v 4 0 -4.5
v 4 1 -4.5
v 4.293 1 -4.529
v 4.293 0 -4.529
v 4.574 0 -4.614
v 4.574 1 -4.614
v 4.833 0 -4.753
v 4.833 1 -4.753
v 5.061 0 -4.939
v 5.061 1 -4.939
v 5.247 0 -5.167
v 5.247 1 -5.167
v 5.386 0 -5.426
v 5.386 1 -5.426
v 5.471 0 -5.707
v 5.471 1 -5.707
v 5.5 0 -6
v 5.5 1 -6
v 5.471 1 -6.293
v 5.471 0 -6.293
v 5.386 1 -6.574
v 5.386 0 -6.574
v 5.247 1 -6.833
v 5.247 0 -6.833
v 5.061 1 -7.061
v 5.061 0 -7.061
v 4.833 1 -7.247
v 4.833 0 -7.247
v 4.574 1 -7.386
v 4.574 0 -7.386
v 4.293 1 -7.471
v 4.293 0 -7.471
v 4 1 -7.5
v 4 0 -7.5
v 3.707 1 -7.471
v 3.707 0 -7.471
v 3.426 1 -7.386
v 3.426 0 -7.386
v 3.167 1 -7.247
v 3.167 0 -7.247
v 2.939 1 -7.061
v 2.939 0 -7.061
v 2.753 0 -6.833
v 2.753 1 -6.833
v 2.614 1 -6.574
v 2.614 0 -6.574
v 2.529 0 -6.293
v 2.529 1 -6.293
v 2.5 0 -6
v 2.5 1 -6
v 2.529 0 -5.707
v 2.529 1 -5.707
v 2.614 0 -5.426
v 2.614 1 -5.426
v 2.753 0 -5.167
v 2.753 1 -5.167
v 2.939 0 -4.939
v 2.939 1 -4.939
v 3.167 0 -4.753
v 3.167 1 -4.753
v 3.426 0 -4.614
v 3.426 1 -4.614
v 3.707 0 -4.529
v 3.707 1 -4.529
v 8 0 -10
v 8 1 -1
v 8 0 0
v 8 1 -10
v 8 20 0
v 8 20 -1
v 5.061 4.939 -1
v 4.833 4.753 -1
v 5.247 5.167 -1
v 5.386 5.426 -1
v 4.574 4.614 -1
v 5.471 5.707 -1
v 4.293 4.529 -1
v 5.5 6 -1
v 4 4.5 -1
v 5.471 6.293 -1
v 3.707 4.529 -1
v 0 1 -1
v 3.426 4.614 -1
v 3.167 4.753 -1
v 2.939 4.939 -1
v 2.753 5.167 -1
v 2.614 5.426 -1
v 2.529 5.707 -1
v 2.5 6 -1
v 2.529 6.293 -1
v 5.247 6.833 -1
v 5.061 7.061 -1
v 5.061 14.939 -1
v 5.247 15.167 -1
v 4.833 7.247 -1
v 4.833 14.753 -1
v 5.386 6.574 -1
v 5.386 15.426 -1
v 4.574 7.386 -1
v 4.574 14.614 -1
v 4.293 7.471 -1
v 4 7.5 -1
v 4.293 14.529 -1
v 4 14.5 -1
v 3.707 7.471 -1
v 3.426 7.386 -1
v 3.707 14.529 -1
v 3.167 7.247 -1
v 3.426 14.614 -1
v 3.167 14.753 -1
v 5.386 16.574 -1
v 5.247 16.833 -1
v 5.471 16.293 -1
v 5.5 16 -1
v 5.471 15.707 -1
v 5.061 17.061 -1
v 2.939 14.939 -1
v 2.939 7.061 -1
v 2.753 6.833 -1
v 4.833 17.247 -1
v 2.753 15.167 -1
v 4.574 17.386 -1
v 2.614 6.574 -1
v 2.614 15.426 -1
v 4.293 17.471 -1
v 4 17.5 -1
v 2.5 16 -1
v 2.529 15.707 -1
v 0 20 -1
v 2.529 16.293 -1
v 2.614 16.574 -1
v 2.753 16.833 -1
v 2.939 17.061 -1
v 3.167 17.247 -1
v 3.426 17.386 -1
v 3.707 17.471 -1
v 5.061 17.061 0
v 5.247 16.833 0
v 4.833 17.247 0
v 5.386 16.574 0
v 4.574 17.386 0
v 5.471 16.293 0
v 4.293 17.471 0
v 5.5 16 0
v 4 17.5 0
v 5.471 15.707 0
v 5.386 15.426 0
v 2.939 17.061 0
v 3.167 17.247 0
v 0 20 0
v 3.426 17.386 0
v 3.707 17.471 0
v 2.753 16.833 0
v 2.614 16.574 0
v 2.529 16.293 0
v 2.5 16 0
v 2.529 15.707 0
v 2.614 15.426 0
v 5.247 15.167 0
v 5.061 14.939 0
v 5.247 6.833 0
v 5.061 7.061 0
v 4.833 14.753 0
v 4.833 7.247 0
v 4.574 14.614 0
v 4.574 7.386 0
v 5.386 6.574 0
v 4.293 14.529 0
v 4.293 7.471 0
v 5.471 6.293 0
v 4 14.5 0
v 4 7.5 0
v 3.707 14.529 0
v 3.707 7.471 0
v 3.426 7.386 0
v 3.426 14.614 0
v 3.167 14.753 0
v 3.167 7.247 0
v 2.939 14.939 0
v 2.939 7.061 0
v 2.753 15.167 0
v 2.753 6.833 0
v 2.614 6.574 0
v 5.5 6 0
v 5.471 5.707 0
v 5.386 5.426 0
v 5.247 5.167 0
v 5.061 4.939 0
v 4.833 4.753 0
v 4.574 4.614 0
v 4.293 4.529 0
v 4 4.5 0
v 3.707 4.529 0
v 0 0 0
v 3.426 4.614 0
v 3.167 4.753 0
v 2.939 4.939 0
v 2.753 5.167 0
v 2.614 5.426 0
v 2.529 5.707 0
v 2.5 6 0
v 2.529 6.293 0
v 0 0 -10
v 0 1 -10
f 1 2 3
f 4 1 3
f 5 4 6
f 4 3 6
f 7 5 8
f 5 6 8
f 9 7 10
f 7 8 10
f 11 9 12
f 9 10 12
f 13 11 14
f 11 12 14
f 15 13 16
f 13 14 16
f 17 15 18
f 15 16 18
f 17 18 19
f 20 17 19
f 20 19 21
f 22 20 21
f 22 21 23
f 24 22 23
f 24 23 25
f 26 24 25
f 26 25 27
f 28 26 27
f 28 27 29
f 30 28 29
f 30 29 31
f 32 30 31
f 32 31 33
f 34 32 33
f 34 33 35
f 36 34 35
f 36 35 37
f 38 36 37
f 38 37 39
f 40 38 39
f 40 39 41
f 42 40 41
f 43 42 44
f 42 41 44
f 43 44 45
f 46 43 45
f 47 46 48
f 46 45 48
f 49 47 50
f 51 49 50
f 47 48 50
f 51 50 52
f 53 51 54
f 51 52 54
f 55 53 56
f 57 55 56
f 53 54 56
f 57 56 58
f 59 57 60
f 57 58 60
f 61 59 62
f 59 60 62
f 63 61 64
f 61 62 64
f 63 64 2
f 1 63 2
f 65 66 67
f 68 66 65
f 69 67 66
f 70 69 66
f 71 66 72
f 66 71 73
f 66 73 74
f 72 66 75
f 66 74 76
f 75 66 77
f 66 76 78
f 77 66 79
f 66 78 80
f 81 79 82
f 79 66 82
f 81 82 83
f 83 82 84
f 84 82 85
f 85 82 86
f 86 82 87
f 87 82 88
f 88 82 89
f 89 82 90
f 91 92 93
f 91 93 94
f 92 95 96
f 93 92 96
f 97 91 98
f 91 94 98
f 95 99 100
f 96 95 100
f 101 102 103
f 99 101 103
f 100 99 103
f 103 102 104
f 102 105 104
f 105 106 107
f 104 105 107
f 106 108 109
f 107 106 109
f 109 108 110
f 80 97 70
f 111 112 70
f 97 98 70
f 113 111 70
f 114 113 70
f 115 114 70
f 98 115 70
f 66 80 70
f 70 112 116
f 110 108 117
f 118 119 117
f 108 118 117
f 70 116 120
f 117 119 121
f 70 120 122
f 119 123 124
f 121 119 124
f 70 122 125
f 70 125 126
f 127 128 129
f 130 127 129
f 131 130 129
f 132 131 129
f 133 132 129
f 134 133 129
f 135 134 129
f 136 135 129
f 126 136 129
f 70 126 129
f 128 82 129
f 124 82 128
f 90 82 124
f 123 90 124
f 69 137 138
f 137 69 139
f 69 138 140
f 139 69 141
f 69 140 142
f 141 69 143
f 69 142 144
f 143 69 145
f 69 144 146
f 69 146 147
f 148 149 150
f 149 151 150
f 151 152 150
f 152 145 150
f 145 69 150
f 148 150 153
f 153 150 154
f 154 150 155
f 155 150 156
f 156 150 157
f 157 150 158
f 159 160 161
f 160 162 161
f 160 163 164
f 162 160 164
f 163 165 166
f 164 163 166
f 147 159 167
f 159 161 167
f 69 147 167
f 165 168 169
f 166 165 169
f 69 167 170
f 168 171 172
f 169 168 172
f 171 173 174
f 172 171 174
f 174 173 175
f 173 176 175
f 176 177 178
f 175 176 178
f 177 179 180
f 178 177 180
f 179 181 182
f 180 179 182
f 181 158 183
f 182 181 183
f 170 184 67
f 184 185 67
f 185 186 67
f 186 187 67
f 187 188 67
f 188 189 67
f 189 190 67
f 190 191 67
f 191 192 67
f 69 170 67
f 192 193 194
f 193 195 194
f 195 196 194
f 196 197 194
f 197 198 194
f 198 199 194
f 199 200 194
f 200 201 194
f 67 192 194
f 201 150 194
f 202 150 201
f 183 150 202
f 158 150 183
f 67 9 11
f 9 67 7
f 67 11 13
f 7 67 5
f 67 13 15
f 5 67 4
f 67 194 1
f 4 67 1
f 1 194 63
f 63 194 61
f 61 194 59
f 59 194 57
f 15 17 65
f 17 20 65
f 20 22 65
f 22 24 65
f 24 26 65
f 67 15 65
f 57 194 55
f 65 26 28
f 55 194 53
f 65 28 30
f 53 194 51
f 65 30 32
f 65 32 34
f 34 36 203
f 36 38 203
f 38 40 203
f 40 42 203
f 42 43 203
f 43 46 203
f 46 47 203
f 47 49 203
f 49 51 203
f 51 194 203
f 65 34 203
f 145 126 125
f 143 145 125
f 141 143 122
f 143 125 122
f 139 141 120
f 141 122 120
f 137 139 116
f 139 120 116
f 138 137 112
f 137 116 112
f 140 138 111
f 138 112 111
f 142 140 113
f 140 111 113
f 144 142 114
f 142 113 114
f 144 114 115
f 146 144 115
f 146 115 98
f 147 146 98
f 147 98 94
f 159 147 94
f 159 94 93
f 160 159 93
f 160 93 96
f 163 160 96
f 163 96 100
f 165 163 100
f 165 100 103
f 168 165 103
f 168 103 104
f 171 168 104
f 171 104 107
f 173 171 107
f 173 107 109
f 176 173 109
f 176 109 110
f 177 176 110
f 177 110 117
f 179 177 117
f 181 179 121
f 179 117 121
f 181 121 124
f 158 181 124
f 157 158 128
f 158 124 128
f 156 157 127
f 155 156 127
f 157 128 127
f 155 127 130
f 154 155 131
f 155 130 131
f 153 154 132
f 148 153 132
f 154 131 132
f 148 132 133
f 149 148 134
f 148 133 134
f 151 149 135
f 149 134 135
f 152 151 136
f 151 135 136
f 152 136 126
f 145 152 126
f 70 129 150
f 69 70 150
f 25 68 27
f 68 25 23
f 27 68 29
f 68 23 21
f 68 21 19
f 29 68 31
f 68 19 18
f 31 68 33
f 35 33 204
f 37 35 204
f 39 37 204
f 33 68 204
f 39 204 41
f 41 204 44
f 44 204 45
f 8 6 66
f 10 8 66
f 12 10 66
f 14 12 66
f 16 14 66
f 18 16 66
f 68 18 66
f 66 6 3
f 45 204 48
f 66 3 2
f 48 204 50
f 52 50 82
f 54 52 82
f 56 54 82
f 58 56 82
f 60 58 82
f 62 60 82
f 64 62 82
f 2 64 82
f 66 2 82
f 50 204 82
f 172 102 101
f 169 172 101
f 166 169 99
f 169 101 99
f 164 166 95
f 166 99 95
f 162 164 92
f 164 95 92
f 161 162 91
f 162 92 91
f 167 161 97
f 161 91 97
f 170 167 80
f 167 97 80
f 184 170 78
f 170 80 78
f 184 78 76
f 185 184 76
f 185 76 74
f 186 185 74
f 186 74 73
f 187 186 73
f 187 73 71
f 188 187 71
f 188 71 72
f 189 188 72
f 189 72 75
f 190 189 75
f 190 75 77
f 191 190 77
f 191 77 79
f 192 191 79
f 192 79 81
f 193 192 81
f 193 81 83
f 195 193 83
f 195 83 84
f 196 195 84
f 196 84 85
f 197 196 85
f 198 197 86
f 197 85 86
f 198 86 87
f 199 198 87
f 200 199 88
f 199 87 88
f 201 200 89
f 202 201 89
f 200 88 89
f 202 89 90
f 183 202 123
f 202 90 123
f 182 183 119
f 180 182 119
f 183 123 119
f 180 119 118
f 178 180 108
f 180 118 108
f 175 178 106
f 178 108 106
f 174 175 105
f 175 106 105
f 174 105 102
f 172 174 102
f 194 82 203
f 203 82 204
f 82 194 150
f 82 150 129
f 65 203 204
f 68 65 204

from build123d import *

# Parameters (mm, degrees)
EXTRUDE_1_DEPTH     = 8
SKETCH_2_R          = 1.5
CUT_EXTRUDE_1_DEPTH = 23.912878475
SKETCH_3_R          = 1.5
CUT_EXTRUDE_2_DEPTH = 24.34523506


with BuildPart() as part:
    # 草图1 → 凸台-拉伸1 (new body)
    with BuildSketch(Plane(origin=(0, 0, 0), x_dir=(0, 0, -1), z_dir=(1, 0, 0))):
        Polygon((0, 0), (10, 0), (10, 1), (1, 1), (1, 20), (0, 20), align=None)
    extrude(amount=EXTRUDE_1_DEPTH)

    # 草图2 → 切除-拉伸1 (cut, through all)
    with BuildSketch(Plane(origin=(0, 1, 0), x_dir=(1, 0, 0), z_dir=(0, 1, 0))):
        with Locations(Location((4, 6, 0), (0, 0, 270))):
            Circle(SKETCH_2_R)
    extrude(amount=-CUT_EXTRUDE_1_DEPTH, mode=Mode.SUBTRACT)

    # 草图3 → 切除-拉伸2 (cut, through all)
    with BuildSketch(Plane(origin=(0, 0, -1), x_dir=(-1, 0, 0), z_dir=(0, 0, -1))):
        with Locations(Location((-4, 16, 0), (0, 0, 90))):
            Circle(SKETCH_3_R)
        with Locations(Location((-4, 6, 0), (0, 0, 90))):
            Circle(SKETCH_3_R)
    extrude(amount=-CUT_EXTRUDE_2_DEPTH, mode=Mode.SUBTRACT)


solid = part.part
